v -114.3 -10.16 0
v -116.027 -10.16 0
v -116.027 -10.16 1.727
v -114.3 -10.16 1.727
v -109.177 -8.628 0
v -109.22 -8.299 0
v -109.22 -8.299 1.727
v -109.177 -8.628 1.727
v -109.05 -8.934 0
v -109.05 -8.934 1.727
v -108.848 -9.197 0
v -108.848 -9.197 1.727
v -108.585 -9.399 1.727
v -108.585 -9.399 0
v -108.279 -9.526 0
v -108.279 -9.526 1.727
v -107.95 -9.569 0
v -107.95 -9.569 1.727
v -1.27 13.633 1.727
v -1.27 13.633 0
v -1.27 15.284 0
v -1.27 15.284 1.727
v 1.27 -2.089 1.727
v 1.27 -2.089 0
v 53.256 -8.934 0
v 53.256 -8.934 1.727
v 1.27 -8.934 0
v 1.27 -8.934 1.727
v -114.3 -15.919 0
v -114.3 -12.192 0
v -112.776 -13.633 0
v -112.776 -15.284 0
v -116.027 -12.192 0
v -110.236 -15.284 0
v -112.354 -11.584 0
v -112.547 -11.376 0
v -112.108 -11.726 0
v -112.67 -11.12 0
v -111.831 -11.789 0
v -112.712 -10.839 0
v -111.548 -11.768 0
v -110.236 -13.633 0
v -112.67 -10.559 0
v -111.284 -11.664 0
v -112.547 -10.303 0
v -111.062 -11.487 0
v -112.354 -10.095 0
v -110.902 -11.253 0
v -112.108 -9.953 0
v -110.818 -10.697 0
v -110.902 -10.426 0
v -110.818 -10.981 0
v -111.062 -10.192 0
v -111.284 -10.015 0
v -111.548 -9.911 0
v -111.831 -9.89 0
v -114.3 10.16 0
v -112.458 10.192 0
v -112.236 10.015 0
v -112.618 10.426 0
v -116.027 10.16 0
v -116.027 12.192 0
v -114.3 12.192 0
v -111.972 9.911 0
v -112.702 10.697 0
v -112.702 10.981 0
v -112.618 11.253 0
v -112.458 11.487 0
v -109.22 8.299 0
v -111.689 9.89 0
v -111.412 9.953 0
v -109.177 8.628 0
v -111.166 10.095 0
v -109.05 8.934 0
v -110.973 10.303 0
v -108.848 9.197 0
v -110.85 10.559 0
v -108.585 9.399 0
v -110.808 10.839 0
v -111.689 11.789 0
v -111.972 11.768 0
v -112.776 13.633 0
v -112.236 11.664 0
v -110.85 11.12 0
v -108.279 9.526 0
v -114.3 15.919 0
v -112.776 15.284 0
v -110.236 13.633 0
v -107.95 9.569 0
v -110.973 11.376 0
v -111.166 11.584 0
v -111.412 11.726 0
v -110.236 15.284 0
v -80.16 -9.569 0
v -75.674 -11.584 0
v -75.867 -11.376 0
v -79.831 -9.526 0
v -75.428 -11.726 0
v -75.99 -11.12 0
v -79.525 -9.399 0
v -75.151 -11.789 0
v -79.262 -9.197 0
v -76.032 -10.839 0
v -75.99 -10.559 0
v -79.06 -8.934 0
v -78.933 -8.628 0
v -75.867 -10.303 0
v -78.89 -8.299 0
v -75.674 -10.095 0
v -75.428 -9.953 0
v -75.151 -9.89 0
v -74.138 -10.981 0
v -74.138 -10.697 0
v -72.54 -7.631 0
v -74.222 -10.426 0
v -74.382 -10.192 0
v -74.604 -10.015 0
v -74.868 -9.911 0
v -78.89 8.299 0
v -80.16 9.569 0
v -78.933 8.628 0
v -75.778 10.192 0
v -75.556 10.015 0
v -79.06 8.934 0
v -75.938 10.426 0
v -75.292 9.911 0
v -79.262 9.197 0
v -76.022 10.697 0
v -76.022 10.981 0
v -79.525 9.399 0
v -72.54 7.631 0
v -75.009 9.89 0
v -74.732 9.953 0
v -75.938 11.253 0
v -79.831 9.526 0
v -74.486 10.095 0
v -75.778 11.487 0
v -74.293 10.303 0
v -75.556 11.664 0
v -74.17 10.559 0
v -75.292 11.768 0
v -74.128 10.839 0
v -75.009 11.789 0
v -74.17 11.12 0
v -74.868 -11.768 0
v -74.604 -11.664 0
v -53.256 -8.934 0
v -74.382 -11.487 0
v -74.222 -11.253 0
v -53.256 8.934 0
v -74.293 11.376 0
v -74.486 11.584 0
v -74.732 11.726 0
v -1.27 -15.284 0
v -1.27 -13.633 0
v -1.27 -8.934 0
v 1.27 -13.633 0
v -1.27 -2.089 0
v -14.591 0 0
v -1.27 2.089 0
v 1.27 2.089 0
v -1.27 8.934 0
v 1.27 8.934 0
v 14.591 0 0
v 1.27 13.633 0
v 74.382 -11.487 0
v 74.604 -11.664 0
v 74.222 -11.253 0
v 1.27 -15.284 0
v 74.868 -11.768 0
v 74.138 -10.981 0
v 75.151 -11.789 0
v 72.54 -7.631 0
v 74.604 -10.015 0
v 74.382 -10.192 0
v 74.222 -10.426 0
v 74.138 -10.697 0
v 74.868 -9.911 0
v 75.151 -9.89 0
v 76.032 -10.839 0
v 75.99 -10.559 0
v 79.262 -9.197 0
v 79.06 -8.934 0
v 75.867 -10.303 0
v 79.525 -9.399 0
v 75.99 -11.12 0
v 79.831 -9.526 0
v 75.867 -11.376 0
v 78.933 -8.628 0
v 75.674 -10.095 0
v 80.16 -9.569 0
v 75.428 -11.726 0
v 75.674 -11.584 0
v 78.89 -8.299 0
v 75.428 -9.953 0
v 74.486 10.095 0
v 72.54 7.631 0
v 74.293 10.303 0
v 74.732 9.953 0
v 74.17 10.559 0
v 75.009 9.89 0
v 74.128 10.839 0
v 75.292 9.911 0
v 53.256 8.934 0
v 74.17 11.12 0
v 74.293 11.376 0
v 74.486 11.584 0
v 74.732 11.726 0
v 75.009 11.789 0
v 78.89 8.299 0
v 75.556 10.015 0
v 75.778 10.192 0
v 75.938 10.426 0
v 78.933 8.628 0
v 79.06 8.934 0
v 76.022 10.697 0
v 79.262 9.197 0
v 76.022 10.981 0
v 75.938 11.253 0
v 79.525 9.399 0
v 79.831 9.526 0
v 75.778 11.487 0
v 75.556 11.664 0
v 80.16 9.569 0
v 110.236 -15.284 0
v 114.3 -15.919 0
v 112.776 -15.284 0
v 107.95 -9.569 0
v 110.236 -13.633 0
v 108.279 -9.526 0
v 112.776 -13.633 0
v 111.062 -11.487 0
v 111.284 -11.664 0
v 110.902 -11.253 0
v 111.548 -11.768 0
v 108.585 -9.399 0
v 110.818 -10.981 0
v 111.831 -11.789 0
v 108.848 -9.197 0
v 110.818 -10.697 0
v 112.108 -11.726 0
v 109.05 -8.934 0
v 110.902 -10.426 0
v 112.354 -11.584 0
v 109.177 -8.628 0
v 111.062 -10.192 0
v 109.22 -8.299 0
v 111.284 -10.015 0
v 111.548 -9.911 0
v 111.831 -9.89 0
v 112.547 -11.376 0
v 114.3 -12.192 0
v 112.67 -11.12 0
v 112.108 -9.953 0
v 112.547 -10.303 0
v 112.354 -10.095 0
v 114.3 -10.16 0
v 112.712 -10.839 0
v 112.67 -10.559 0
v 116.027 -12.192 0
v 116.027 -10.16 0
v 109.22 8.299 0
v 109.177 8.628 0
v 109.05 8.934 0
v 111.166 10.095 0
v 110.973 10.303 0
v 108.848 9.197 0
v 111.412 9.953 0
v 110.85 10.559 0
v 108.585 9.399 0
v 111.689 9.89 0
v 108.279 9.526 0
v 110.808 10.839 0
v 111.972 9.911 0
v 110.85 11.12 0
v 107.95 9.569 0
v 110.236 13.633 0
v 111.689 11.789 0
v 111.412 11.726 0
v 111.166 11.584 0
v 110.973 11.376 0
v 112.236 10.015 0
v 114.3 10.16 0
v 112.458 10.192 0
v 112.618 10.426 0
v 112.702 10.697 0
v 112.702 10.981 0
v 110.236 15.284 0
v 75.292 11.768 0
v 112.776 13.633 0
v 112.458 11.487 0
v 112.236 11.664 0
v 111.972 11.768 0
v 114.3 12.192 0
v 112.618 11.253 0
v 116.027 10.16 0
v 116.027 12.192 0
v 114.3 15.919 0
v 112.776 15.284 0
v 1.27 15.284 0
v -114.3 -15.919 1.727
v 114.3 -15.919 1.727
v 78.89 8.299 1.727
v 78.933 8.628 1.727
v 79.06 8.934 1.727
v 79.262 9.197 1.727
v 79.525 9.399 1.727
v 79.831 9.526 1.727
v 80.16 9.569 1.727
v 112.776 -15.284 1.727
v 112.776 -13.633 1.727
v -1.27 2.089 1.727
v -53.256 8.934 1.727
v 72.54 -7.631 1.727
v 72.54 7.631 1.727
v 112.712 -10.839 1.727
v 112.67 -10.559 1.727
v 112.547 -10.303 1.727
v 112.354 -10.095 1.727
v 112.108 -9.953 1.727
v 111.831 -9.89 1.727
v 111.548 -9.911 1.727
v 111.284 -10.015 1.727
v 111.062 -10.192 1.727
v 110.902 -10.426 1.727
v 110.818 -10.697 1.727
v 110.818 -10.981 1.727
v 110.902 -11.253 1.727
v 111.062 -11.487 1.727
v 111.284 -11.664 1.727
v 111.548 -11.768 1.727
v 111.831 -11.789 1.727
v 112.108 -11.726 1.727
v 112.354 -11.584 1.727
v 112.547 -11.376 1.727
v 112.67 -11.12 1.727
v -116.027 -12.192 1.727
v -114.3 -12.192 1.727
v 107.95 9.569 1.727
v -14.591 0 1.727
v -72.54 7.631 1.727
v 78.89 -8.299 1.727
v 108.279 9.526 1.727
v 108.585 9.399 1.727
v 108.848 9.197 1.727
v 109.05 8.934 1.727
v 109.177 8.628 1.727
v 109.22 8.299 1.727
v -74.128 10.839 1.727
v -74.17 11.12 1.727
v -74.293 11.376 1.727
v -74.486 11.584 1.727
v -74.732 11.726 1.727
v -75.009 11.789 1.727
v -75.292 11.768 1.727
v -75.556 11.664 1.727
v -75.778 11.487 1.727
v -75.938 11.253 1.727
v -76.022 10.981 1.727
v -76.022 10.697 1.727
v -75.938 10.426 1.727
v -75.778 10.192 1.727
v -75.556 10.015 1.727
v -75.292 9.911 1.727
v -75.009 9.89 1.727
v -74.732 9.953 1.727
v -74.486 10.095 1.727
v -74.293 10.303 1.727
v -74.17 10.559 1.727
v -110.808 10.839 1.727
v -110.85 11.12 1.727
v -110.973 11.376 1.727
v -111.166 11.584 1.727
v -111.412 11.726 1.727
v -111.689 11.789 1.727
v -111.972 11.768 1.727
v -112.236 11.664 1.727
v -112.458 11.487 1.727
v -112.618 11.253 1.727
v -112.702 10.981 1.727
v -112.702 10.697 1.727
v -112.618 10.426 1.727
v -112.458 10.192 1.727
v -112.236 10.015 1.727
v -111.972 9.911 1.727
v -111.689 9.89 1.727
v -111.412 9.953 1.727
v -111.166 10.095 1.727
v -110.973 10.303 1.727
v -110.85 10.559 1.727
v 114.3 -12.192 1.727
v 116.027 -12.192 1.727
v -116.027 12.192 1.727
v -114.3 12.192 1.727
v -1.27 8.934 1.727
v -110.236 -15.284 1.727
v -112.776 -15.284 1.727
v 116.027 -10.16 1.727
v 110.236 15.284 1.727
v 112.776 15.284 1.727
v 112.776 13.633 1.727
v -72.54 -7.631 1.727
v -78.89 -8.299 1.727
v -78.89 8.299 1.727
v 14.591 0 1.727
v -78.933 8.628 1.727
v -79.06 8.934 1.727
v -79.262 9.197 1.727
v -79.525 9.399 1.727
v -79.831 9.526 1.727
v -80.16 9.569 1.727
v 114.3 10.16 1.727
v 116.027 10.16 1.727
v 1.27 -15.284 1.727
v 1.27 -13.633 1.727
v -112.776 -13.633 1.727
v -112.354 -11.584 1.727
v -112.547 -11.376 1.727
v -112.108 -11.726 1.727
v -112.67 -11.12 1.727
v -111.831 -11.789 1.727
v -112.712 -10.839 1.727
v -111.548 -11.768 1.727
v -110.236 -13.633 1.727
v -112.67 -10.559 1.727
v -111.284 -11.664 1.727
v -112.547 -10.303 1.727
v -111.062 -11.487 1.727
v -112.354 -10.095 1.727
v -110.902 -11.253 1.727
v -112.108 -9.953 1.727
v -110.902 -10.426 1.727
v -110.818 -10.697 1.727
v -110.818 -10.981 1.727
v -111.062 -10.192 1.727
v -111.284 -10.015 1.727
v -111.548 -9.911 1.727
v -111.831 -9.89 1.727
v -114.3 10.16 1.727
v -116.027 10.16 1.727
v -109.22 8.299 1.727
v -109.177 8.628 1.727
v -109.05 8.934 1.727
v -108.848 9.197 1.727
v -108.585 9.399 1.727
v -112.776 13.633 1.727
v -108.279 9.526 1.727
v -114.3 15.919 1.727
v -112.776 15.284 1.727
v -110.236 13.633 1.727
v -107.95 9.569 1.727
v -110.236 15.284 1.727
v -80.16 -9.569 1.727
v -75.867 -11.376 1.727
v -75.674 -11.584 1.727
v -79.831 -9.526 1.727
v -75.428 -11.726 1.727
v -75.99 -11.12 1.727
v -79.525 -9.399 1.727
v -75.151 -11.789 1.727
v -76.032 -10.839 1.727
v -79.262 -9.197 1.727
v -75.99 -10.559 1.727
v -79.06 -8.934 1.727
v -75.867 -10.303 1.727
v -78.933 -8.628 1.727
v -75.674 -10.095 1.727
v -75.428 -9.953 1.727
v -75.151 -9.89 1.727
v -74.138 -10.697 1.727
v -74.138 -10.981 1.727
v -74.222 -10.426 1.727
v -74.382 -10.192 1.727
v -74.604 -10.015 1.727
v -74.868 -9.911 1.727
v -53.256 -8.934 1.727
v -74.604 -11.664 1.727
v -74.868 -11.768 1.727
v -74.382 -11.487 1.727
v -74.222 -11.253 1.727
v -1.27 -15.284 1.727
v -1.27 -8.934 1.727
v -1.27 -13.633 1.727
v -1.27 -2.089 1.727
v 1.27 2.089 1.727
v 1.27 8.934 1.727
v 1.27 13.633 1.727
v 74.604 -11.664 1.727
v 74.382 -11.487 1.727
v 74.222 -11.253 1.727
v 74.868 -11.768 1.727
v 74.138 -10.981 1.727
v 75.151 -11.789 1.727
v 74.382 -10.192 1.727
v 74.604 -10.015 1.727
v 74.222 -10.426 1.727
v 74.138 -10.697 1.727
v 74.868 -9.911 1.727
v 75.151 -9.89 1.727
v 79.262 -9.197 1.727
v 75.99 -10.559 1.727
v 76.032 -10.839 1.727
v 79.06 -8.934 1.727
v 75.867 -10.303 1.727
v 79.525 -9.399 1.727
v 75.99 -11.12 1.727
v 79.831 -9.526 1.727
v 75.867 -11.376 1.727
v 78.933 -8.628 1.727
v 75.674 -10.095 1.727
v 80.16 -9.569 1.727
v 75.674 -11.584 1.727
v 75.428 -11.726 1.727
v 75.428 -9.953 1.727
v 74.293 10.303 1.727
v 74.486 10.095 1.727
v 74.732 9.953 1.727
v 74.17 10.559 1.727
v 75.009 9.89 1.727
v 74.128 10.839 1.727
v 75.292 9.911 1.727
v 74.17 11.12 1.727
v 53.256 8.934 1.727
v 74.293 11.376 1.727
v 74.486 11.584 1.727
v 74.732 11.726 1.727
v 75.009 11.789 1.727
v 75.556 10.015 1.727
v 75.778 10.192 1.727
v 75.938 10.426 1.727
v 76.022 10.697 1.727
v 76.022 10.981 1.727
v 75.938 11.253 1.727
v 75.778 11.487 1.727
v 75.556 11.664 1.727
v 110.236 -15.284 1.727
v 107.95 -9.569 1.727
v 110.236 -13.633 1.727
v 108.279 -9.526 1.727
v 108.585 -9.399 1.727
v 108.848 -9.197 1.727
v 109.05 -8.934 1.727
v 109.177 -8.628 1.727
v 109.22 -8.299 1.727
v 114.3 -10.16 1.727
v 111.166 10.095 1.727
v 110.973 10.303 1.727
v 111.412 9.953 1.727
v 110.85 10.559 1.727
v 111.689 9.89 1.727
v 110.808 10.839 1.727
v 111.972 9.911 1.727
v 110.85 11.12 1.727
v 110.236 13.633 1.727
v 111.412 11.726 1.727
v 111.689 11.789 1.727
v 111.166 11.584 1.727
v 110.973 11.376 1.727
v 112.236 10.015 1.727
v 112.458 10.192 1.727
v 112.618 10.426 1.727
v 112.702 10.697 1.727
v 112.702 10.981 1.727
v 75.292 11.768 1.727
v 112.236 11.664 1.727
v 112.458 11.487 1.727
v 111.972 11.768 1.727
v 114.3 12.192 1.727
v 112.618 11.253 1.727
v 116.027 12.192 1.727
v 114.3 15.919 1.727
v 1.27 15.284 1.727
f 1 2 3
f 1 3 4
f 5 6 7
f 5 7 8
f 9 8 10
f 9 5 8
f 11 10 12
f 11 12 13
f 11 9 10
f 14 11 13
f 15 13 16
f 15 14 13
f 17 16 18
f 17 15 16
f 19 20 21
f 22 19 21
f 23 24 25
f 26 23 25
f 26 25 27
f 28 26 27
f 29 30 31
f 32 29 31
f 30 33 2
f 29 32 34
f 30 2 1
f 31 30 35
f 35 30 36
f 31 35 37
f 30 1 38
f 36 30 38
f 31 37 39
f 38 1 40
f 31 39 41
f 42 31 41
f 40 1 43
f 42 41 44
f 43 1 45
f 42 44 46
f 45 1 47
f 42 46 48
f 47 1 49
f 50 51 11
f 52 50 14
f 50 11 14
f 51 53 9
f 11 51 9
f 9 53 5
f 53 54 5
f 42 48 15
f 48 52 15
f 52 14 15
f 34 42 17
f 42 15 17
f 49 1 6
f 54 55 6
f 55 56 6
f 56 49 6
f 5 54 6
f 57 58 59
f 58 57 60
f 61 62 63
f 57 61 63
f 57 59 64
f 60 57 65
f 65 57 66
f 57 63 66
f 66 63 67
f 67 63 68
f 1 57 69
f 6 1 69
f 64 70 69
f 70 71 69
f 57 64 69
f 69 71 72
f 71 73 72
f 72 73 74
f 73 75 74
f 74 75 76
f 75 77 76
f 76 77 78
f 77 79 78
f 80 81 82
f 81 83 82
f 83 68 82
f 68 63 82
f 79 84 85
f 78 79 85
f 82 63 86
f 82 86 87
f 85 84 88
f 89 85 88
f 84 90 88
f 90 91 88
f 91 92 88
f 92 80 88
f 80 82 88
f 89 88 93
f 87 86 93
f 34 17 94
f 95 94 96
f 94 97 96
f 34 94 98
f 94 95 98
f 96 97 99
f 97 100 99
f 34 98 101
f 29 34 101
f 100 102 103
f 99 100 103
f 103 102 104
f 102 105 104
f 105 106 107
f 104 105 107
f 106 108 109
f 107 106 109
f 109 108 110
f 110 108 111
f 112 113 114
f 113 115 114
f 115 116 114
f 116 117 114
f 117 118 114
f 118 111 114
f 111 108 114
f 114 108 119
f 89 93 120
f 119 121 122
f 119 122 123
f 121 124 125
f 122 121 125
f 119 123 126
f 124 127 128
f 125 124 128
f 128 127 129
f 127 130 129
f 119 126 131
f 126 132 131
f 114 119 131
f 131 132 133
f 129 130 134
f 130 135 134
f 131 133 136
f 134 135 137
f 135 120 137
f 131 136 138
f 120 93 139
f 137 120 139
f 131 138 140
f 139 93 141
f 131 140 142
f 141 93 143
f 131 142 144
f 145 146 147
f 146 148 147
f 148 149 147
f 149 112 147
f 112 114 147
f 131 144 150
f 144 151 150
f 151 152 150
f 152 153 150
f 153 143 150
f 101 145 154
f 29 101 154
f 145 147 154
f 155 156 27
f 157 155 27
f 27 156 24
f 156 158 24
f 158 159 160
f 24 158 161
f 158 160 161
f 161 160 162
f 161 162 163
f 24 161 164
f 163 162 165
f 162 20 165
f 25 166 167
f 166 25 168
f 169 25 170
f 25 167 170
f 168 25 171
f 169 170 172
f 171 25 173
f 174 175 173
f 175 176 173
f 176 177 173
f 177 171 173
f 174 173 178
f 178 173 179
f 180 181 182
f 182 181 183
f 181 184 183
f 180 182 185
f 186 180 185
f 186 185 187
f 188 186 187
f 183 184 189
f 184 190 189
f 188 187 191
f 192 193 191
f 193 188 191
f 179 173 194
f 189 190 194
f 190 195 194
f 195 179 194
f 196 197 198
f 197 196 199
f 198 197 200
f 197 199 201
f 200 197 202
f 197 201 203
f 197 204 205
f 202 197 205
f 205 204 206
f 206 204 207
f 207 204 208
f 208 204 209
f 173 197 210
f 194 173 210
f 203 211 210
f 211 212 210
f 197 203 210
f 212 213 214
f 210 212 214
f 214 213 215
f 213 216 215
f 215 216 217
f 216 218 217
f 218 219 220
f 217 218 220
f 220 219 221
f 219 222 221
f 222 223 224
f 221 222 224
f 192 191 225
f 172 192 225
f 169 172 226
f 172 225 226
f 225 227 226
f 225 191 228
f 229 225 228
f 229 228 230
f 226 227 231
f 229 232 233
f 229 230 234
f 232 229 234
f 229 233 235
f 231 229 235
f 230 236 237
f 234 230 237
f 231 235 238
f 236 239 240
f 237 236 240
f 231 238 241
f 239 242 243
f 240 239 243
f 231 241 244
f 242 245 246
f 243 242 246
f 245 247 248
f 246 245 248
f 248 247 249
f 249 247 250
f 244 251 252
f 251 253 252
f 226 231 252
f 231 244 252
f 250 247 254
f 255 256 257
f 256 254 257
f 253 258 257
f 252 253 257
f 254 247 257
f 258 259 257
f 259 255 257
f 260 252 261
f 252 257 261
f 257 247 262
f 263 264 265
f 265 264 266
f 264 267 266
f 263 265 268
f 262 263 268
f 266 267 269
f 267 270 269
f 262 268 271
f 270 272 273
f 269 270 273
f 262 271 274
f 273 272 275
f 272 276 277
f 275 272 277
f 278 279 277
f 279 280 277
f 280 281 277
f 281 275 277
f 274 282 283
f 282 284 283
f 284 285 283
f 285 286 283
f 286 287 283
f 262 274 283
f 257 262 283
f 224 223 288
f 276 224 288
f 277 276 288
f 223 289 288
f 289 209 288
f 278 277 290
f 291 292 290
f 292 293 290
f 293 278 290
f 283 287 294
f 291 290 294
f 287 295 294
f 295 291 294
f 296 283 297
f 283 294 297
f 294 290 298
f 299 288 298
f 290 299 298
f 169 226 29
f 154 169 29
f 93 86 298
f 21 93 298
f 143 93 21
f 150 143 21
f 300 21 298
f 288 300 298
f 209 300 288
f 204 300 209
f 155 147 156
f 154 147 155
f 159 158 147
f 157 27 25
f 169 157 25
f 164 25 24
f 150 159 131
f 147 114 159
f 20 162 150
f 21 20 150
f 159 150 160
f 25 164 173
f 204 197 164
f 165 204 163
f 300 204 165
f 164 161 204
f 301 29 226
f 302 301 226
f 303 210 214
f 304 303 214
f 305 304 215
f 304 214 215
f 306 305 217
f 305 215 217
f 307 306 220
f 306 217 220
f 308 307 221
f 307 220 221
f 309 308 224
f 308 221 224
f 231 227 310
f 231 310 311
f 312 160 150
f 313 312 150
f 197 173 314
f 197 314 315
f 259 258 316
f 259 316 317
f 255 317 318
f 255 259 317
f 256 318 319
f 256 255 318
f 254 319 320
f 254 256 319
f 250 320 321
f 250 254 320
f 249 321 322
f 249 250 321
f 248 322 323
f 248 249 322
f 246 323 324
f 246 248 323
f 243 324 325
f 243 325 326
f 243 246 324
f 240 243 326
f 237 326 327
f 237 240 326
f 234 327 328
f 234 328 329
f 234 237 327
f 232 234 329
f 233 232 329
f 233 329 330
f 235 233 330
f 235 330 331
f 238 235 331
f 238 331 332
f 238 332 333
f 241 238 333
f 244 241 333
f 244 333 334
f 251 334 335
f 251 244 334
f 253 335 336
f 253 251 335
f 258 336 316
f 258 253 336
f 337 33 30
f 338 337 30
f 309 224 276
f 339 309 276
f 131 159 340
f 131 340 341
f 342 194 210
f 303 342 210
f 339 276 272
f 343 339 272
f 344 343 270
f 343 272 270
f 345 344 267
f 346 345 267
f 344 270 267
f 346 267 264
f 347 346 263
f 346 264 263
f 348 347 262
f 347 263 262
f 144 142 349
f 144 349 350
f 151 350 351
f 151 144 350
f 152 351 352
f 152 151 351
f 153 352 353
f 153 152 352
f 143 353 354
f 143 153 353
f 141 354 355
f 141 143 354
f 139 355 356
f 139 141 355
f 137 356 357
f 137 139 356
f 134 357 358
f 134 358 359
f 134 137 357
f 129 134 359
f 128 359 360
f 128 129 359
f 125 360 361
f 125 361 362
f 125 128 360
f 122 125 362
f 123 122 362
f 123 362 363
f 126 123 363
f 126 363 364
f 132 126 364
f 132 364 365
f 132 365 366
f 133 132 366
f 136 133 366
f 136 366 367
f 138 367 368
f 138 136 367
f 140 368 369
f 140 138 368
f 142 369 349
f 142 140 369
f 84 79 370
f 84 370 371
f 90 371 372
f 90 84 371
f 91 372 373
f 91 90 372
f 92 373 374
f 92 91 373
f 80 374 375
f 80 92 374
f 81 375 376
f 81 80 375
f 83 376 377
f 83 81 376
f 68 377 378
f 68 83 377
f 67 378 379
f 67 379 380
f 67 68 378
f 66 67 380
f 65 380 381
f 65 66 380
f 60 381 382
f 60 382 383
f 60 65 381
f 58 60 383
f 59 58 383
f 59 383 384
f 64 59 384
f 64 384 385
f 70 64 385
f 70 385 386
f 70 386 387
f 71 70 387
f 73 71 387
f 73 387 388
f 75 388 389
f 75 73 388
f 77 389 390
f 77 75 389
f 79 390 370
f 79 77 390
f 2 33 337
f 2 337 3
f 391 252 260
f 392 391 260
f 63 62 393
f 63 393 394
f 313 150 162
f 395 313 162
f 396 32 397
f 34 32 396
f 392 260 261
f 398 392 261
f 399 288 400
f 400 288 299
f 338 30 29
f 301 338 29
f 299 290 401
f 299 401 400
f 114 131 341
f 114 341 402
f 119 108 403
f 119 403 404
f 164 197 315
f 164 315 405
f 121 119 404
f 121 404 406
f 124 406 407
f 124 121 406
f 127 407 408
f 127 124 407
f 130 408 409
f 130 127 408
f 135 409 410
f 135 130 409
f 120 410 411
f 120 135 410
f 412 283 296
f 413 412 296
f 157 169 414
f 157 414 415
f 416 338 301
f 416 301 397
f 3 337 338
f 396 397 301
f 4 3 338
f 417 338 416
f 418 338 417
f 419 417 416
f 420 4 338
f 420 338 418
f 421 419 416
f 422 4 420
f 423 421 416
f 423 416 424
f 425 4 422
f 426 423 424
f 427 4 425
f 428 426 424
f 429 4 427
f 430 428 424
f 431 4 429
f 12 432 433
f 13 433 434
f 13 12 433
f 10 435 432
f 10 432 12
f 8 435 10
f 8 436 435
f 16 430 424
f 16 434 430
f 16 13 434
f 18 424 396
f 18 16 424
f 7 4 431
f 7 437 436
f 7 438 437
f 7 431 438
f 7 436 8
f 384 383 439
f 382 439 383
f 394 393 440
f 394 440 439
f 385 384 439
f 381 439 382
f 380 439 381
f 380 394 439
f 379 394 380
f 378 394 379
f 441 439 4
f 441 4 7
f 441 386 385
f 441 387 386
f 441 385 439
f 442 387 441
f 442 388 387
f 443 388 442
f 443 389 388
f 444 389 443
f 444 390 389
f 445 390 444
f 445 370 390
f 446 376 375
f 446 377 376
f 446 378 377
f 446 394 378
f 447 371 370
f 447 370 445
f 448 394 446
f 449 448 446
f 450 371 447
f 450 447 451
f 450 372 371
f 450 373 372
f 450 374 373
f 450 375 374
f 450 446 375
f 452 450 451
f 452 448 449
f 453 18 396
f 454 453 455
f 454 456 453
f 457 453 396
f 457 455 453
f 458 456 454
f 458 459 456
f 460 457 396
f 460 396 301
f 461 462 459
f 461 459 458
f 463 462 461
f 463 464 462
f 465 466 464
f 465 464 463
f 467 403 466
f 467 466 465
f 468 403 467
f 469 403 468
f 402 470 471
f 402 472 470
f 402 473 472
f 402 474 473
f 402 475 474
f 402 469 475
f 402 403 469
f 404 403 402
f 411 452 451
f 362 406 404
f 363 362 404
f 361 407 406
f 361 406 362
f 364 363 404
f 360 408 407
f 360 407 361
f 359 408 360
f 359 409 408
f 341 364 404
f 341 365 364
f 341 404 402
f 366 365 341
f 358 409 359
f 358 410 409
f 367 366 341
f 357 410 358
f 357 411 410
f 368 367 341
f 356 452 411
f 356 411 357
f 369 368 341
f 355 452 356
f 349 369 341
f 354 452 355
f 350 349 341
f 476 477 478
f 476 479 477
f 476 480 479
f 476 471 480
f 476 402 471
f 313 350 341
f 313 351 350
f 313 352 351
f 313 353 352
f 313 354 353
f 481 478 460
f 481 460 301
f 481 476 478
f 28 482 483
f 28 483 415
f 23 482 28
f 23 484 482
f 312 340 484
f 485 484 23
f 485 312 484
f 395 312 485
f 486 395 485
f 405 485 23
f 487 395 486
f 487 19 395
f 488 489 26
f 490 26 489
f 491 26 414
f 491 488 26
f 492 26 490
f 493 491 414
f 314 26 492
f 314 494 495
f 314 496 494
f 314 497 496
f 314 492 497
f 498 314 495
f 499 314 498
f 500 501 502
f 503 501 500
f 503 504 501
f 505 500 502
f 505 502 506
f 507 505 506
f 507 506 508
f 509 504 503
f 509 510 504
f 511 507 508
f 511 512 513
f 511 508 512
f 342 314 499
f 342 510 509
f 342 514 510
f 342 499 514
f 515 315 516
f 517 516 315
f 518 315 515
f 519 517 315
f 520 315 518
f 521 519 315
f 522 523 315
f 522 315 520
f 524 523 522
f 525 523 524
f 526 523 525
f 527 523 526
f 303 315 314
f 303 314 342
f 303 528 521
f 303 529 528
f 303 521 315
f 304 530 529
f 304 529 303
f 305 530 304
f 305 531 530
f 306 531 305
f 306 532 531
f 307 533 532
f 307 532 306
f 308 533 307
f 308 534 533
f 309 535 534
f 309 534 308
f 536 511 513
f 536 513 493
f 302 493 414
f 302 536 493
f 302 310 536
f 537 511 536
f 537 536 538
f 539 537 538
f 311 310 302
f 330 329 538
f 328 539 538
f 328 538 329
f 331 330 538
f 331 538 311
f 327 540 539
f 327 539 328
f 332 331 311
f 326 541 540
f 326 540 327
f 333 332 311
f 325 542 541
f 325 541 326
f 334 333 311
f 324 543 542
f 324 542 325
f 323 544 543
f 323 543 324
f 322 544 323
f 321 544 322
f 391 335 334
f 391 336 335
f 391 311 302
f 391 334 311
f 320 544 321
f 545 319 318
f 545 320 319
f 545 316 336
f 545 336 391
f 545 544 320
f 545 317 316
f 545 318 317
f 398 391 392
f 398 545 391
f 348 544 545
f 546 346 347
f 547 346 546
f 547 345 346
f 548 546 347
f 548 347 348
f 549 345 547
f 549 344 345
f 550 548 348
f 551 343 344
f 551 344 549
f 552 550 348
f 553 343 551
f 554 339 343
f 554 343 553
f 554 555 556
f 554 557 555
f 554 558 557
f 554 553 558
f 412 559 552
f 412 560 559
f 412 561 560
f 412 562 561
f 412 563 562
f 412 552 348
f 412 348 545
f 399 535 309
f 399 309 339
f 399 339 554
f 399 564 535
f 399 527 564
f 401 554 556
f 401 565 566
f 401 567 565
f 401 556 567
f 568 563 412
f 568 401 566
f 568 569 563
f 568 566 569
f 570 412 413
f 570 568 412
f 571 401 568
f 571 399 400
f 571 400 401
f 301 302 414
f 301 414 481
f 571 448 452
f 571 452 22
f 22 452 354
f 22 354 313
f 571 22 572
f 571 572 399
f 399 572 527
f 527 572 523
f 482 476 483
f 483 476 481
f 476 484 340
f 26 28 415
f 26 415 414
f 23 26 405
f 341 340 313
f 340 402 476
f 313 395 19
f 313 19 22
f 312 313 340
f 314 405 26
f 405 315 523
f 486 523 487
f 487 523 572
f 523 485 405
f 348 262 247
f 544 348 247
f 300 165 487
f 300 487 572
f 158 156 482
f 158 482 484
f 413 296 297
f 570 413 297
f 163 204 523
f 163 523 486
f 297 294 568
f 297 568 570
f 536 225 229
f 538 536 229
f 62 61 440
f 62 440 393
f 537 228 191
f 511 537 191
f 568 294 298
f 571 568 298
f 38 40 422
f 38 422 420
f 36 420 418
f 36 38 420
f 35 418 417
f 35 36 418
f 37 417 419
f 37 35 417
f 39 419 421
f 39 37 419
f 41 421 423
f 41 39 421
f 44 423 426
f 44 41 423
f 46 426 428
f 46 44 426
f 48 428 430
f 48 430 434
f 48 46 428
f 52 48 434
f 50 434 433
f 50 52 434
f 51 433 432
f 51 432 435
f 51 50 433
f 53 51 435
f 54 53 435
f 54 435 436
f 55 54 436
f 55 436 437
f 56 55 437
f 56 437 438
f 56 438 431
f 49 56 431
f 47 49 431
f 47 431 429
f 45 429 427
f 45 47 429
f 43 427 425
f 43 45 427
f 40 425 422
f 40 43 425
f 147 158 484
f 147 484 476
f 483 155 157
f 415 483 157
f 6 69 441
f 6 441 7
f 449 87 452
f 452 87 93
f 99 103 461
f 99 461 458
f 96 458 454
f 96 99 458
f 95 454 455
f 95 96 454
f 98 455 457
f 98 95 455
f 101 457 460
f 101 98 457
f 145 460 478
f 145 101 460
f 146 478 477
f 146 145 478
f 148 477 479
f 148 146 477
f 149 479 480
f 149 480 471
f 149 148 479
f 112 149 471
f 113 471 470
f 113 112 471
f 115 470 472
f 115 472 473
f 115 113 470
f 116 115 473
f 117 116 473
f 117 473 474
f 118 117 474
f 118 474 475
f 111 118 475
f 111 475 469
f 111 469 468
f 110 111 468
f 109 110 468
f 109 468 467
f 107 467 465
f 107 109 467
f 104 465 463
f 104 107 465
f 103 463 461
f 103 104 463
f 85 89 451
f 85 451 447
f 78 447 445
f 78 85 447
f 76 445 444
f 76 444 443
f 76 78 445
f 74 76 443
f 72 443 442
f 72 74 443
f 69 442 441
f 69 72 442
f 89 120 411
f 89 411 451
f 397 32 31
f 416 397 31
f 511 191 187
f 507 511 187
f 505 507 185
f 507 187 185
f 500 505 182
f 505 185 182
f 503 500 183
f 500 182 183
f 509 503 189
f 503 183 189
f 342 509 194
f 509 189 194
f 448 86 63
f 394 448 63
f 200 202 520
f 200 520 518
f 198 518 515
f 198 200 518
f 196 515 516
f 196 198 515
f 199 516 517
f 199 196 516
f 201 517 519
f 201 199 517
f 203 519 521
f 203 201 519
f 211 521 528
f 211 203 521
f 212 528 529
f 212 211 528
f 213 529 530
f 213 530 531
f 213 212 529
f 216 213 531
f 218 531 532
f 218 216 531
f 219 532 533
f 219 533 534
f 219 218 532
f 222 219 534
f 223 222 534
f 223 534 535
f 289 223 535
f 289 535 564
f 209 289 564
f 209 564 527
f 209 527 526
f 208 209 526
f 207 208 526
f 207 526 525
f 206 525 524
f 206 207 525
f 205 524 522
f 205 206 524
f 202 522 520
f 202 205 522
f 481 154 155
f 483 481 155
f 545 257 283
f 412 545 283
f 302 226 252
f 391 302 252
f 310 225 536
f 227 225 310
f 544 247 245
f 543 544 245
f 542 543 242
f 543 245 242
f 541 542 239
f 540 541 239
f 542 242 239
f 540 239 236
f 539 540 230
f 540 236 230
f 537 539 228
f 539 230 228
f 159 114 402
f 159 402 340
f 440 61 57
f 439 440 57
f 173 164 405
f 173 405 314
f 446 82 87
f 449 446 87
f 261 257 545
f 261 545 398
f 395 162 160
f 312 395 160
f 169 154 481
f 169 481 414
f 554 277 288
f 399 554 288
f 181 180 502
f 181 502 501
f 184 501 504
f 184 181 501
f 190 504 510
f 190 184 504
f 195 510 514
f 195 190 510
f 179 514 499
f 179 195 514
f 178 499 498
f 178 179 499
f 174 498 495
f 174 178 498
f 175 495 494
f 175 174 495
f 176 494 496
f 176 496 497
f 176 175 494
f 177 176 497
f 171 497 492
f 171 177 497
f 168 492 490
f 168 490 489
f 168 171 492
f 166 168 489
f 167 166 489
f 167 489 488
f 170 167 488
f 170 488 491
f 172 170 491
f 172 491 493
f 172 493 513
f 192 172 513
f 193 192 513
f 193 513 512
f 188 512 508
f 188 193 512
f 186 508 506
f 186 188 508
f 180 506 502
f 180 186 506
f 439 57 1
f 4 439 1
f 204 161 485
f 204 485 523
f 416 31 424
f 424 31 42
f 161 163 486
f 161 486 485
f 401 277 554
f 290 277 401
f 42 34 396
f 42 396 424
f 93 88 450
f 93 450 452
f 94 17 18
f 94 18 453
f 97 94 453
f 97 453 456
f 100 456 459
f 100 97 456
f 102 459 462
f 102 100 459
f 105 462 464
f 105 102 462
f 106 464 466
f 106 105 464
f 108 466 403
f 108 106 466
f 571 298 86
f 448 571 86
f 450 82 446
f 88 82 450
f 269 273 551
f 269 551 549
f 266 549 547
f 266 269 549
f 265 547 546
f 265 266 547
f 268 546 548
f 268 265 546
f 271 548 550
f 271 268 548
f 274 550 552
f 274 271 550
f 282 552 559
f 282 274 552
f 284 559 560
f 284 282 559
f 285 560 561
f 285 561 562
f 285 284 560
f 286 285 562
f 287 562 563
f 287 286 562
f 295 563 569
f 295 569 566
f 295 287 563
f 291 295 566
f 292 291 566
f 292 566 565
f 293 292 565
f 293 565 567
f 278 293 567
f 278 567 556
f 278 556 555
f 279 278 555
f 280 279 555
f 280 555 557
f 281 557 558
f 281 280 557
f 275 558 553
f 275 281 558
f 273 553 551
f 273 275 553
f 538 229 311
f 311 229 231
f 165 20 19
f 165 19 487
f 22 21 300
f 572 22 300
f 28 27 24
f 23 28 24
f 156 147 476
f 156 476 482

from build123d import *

# Parameters (mm, degrees)
SKETCH1_R           = 0.9525
SKETCH1_W           = 2.54
SKETCH1_H           = 1.651
BOSS_EXTRUDE1_DEPTH = 1.7272
SKETCH3_W           = 1.7272
SKETCH3_H           = 2.032
BOSS_EXTRUDE2_DEPTH = 1.7272


with BuildPart() as part:
    # Sketch1 → Boss-Extrude1 (new body)
    with BuildSketch(Plane.XY):
        Polygon((-114.3, 13.37945), (-114.3, -13.37945), (-114.3, -15.91945), (114.3, -15.91945), (114.3, -13.37945), (114.3, 13.37945), (114.3, 15.91945), (-114.3, 15.91945), align=None)
        with Locations((-111.76, 10.83945)):
            Circle(SKETCH1_R, mode=Mode.SUBTRACT)
        with Locations(Location((-111.76, -10.83945, 0), (0, 0, 180))):
            Circle(SKETCH1_R, mode=Mode.SUBTRACT)
        with Locations((-75.08, 10.83945)):
            Circle(SKETCH1_R, mode=Mode.SUBTRACT)
        with Locations(Location((-75.08, -10.83945, 0), (0, 0, 180))):
            Circle(SKETCH1_R, mode=Mode.SUBTRACT)
        with Locations(Location((75.08, 10.83945, 0), (0, 0, 180))):
            Circle(SKETCH1_R, mode=Mode.SUBTRACT)
        with Locations(Location((111.76, 10.83945, 0), (0, 0, 180))):
            Circle(SKETCH1_R, mode=Mode.SUBTRACT)
        with Locations((111.76, -10.83945)):
            Circle(SKETCH1_R, mode=Mode.SUBTRACT)
        with Locations((75.08, -10.83945)):
            Circle(SKETCH1_R, mode=Mode.SUBTRACT)
        with BuildLine():
            Line((-107.95, -9.56945), (-80.16, -9.56945))
            ThreePointArc((-80.16, -9.56945), (-79.261974388, -9.197475612), (-78.89, -8.29945))
            Line((-78.89, -8.29945), (-78.89, 8.29945))
            ThreePointArc((-78.89, 8.29945), (-79.261974388, 9.197475612), (-80.16, 9.56945))
            Line((-80.16, 9.56945), (-107.95, 9.56945))
            ThreePointArc((-107.95, 9.56945), (-108.848025612, 9.197475612), (-109.22, 8.29945))
            Line((-109.22, 8.29945), (-109.22, -8.29945))
            ThreePointArc((-109.22, -8.29945), (-108.848025612, -9.197475612), (-107.95, -9.56945))
        make_face(mode=Mode.SUBTRACT)
        Polygon((-1.27, -8.93445), (-1.27, -2.088687016), (-53.255686673, -8.93445), align=None, mode=Mode.SUBTRACT)
        with BuildLine():
            Line((78.89, -8.29945), (78.89, 8.29945))
            ThreePointArc((78.89, 8.29945), (79.261974388, 9.197475612), (80.16, 9.56945))
            Line((80.16, 9.56945), (107.95, 9.56945))
            ThreePointArc((107.95, 9.56945), (108.848025612, 9.197475612), (109.22, 8.29945))
            Line((109.22, 8.29945), (109.22, -8.29945))
            ThreePointArc((109.22, -8.29945), (108.848025612, -9.197475612), (107.95, -9.56945))
            Line((107.95, -9.56945), (80.16, -9.56945))
            ThreePointArc((80.16, -9.56945), (79.261974388, -9.197475612), (78.89, -8.29945))
        make_face(mode=Mode.SUBTRACT)
        Polygon((-14.591172672, 0), (-72.54, 7.631022354), (-72.54, -7.631022354), align=None, mode=Mode.SUBTRACT)
        Polygon((-1.27, 8.93445), (-1.27, 2.088687016), (-53.255686673, 8.93445), align=None, mode=Mode.SUBTRACT)
        Polygon((1.27, -8.93445), (1.27, -2.088687016), (53.255686673, -8.93445), align=None, mode=Mode.SUBTRACT)
        Polygon((1.27, 8.93445), (1.27, 2.088687016), (53.255686673, 8.93445), align=None, mode=Mode.SUBTRACT)
        Polygon((14.591172672, 0), (72.54, -7.631022354), (72.54, 7.631022354), align=None, mode=Mode.SUBTRACT)
        with Locations((111.506, 14.45895)):
            Rectangle(SKETCH1_W, SKETCH1_H, mode=Mode.SUBTRACT)
        with Locations((111.506, -14.45895)):
            Rectangle(SKETCH1_W, SKETCH1_H, mode=Mode.SUBTRACT)
        with Locations((-111.506, 14.45895)):
            Rectangle(SKETCH1_W, SKETCH1_H, mode=Mode.SUBTRACT)
        with Locations((-111.506, -14.45895)):
            Rectangle(SKETCH1_W, SKETCH1_H, mode=Mode.SUBTRACT)
        with Locations((0, -14.45895)):
            Rectangle(SKETCH1_W, SKETCH1_H, mode=Mode.SUBTRACT)
        with Locations((0, 14.45895)):
            Rectangle(SKETCH1_W, SKETCH1_H, mode=Mode.SUBTRACT)
    extrude(amount=BOSS_EXTRUDE1_DEPTH)

    # Sketch3 → Boss-Extrude2 (add)
    with BuildSketch(Plane.XY):
        with Locations((-115.1636, 11.176)):
            Rectangle(SKETCH3_W, SKETCH3_H)
        with Locations((-115.1636, -11.176)):
            Rectangle(SKETCH3_W, SKETCH3_H)
        with Locations((115.1636, -11.176)):
            Rectangle(SKETCH3_W, SKETCH3_H)
        with Locations((115.1636, 11.176)):
            Rectangle(SKETCH3_W, SKETCH3_H)
    extrude(amount=BOSS_EXTRUDE2_DEPTH)


solid = part.part
